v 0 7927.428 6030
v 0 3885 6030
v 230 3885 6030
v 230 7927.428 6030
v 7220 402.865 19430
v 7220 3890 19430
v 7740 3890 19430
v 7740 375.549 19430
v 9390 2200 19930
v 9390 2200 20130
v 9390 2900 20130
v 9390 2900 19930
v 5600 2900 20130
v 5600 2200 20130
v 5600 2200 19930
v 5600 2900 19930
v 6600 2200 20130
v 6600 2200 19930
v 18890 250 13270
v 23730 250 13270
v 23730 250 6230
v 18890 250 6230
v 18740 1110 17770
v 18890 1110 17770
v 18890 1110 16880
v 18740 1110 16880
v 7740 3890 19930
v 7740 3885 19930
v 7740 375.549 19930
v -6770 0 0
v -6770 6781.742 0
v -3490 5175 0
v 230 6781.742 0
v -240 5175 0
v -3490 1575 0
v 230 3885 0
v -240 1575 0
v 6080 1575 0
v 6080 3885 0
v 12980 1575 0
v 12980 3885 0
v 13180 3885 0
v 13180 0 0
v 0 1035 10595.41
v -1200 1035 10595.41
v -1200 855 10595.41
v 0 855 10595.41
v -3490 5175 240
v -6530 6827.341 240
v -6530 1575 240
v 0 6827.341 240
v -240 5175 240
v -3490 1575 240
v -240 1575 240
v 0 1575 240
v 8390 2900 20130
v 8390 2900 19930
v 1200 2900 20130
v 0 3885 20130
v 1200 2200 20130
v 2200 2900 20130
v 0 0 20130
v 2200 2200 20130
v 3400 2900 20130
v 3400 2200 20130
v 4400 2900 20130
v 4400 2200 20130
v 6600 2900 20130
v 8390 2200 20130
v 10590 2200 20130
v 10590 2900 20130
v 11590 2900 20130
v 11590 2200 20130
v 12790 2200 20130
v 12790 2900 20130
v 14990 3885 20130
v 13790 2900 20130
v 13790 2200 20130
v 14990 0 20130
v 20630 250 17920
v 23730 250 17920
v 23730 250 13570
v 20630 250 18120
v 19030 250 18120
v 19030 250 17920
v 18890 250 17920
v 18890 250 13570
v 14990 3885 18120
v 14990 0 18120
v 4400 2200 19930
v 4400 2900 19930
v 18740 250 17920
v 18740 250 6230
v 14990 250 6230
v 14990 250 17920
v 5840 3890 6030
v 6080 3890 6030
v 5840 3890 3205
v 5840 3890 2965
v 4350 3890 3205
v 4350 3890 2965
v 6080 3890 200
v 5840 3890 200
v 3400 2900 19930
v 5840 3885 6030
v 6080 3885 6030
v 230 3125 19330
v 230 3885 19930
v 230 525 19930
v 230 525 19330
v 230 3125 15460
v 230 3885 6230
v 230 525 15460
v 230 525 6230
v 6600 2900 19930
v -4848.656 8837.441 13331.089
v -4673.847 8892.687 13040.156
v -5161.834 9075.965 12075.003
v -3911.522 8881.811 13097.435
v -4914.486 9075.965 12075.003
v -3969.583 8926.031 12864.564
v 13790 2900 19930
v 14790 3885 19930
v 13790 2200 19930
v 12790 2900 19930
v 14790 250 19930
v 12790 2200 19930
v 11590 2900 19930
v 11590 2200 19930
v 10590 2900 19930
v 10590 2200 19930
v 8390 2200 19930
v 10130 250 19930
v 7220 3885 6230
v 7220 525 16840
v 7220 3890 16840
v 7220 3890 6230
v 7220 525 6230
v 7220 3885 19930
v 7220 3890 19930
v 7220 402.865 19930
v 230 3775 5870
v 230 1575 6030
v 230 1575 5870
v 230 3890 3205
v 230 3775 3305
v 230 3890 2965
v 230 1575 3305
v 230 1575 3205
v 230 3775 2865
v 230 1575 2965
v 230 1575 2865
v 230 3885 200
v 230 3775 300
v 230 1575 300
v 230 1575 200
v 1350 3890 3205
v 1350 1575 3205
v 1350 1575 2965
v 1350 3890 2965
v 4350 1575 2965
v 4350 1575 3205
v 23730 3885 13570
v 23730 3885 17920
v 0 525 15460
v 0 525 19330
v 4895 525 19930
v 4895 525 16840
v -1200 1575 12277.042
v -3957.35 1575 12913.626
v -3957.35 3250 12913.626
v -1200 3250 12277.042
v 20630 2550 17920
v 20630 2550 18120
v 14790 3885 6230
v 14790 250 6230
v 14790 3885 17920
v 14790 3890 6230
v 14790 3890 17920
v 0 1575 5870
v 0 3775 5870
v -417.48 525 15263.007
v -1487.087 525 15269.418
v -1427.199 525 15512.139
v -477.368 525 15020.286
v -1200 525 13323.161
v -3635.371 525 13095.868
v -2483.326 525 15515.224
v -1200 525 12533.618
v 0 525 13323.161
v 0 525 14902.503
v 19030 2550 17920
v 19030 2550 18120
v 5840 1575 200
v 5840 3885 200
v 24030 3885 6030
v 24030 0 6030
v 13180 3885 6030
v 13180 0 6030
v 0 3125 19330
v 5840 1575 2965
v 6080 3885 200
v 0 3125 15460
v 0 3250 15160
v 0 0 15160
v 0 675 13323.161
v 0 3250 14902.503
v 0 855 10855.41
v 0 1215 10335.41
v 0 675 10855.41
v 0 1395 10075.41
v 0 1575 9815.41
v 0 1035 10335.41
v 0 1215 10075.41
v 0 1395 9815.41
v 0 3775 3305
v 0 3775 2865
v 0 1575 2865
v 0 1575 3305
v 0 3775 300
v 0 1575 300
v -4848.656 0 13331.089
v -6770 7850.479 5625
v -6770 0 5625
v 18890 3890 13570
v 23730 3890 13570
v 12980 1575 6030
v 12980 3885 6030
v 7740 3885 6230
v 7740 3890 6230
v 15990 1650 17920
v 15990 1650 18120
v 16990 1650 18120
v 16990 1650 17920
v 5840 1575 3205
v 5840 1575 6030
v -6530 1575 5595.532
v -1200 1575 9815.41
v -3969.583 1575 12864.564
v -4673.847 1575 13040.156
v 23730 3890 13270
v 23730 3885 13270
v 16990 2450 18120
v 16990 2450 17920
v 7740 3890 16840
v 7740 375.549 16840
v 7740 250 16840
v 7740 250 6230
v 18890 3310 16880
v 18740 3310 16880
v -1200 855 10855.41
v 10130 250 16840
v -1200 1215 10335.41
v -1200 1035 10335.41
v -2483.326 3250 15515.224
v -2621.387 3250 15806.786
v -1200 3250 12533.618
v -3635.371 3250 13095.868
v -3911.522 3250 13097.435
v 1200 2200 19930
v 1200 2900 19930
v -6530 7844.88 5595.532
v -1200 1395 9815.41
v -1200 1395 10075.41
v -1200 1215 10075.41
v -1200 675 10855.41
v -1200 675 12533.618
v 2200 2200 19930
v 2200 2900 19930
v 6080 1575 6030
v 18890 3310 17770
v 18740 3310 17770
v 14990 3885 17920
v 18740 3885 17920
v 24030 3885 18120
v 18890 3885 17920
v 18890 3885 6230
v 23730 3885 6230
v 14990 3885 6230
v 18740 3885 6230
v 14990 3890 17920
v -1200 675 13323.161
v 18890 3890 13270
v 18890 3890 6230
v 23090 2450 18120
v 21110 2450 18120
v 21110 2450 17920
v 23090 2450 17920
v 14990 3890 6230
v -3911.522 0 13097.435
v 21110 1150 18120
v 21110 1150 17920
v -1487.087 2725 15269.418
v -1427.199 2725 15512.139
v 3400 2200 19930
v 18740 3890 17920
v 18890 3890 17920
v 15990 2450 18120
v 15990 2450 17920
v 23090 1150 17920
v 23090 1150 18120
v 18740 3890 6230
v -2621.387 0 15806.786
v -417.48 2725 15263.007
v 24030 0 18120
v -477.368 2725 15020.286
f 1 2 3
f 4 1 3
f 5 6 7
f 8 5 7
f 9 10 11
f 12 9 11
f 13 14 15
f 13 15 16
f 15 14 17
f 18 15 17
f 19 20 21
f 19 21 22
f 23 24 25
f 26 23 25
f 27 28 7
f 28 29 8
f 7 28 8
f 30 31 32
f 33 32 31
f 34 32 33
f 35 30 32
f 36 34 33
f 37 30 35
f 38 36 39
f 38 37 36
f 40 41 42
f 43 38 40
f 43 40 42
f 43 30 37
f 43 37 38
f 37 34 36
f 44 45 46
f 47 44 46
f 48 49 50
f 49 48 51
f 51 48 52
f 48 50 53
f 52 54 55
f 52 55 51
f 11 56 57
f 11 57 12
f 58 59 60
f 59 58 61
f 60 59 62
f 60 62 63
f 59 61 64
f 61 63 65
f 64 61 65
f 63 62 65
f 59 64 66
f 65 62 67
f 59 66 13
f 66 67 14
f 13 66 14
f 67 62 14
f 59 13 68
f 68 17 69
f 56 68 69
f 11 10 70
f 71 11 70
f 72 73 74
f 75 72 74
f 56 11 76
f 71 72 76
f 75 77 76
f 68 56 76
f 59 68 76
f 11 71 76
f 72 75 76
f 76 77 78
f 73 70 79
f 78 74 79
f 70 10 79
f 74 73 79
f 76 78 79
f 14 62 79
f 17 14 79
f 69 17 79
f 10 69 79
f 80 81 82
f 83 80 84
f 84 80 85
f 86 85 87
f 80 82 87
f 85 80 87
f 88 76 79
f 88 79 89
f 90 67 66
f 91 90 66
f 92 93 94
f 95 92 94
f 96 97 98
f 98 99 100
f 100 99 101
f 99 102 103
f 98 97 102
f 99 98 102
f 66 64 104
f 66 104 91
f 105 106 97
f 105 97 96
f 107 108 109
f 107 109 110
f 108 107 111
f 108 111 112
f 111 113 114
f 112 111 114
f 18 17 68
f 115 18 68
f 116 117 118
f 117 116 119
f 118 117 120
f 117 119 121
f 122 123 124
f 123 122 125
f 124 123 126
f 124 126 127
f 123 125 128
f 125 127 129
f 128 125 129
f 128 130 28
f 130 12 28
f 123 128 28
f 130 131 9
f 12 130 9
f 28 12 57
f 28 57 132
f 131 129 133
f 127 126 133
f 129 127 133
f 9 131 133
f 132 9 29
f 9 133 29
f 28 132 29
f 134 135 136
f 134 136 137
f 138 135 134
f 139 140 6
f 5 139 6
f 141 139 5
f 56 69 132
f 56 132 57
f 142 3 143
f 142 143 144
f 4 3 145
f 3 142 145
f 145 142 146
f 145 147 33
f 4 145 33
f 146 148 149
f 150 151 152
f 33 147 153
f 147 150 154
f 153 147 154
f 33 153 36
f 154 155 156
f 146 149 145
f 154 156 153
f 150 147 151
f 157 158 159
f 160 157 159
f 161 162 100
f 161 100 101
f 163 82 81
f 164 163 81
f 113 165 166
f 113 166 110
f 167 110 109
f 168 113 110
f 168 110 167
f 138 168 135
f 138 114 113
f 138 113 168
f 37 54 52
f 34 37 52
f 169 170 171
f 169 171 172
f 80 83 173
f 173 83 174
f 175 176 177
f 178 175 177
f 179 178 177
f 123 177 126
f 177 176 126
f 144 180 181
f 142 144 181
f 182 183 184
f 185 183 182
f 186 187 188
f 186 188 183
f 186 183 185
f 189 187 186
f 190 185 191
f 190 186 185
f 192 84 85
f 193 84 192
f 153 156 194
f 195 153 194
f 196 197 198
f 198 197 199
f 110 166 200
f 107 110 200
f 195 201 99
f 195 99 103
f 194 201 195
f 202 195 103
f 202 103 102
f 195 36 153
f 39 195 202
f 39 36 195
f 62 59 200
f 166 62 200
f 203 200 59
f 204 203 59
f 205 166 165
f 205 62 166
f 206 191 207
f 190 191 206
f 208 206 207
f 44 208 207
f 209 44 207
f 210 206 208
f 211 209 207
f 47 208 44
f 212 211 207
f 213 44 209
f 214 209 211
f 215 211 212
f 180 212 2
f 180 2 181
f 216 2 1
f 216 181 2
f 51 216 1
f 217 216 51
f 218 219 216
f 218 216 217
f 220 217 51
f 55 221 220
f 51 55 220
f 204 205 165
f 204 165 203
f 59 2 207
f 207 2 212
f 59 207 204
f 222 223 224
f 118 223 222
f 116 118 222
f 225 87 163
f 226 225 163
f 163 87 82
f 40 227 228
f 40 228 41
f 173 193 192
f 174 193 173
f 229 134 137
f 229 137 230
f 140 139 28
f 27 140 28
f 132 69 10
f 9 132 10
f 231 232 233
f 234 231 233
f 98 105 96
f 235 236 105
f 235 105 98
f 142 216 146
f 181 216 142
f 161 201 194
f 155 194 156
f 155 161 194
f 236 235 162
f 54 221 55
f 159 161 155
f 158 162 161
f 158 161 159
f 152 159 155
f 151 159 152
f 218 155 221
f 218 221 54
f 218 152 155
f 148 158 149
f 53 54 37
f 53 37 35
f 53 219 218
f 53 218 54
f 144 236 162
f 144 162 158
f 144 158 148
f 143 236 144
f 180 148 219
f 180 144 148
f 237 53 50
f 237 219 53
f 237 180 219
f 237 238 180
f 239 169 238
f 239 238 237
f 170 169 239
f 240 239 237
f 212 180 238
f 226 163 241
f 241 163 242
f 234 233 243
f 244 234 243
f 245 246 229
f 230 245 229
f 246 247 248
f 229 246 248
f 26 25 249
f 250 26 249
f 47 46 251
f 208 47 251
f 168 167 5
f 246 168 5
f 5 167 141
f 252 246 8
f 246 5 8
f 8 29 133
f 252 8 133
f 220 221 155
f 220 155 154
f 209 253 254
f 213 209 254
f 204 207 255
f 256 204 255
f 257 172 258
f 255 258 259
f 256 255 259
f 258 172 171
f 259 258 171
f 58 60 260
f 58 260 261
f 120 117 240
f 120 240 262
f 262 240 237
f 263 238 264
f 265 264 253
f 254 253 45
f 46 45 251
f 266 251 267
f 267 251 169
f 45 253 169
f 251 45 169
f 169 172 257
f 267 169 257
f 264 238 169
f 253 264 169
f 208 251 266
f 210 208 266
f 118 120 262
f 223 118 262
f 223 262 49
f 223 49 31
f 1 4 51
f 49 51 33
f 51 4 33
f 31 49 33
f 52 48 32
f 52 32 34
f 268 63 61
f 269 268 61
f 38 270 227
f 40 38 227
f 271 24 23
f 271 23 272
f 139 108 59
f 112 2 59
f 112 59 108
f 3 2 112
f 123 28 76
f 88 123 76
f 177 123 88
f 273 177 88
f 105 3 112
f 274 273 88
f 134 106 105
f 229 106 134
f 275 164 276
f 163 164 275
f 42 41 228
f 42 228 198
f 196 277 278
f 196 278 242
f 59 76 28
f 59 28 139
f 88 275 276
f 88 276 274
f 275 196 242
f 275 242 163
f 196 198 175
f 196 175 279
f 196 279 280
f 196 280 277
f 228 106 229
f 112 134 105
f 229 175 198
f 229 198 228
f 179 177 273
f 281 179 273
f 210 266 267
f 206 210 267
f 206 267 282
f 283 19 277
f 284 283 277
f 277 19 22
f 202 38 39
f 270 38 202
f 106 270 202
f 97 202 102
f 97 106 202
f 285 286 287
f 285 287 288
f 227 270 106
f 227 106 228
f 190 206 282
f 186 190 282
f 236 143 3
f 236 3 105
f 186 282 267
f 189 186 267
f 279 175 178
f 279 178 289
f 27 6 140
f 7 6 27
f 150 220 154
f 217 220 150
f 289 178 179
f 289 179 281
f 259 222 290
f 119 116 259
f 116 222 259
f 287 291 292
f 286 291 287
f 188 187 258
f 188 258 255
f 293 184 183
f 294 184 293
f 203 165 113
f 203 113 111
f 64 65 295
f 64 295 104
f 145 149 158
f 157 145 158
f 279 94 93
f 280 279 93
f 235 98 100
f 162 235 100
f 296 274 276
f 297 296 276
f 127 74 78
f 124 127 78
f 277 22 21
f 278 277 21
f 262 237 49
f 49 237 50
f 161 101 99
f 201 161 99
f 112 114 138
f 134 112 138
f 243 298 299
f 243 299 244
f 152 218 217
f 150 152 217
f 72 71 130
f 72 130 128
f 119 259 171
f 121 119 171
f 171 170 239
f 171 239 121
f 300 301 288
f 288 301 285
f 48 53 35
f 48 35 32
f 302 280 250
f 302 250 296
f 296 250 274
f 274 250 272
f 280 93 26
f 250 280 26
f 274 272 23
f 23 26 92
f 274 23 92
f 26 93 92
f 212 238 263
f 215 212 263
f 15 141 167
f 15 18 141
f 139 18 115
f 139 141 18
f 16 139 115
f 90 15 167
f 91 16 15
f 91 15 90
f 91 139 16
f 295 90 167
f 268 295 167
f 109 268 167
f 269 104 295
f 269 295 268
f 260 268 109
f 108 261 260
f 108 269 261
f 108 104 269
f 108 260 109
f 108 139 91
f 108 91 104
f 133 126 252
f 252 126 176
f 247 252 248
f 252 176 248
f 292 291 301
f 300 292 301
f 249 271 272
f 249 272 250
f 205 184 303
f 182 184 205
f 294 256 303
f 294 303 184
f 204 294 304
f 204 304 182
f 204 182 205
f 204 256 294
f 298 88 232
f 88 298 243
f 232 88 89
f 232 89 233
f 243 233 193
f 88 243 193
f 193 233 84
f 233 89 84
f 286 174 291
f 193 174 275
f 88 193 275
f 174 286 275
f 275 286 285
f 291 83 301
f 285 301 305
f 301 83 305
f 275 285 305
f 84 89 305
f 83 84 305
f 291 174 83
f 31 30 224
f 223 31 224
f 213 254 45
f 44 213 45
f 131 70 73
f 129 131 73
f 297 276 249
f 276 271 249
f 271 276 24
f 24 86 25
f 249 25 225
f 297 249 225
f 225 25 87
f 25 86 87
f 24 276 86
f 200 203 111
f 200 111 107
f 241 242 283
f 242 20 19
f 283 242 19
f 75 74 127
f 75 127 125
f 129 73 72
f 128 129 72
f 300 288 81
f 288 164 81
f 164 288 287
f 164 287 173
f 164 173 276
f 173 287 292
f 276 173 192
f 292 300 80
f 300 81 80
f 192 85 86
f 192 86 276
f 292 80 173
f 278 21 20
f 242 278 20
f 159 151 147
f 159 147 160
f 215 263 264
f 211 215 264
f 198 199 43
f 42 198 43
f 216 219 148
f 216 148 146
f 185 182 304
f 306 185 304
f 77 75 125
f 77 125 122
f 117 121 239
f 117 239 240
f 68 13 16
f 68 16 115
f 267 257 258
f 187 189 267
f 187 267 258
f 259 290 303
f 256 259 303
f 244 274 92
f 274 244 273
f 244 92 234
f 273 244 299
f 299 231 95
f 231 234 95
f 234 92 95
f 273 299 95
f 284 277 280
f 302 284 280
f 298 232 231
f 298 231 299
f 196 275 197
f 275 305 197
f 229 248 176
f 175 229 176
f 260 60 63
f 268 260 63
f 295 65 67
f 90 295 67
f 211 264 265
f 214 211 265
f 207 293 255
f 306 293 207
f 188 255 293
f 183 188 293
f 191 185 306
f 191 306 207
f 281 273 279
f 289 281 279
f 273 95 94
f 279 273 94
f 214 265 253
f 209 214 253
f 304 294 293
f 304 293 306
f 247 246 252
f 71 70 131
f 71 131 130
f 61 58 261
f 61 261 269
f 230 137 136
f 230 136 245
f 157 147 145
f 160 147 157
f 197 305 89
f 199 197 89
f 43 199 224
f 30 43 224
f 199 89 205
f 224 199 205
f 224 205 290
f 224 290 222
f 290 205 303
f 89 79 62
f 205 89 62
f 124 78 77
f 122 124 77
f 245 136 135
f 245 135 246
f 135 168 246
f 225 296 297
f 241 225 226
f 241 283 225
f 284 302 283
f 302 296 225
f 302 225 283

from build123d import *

# Parameters (mm, degrees)
AUFSATZ_LINEAR_AUSTRAGEN4_DEPTH      = 250
SKIZZE5_W                            = 12750
SKIZZE5_H                            = 5830
AUFSATZ_LINEAR_AUSTRAGEN5_DEPTH      = 3635
SKIZZE6_W                            = 200
SKIZZE6_H                            = 11690
SKIZZE6_W_2                          = 520
SKIZZE6_H_2                          = 10610
SKIZZE6_H_3                          = 500
SKIZZE6_W_3                          = 1120
SKIZZE6_H_4                          = 240
AUFSATZ_LINEAR_AUSTRAGEN6_DEPTH      = 3640
SCHNITT_LINEAR_AUSTRAGEN1_REACH      = 30348.456
SKIZZE7_W                            = 1980
SKIZZE7_H                            = 1300
SKIZZE7_W_2                          = 1600
SKIZZE7_H_2                          = 2300
SKIZZE7_W_3                          = 1000
SKIZZE7_H_3                          = 800
SCHNITT_LINEAR_AUSTRAGEN2_REACH      = 27879.968
SKIZZE8_W                            = 890
SKIZZE8_H                            = 2200
SCHNITT_LINEAR_AUSTRAGEN3_REACH      = 31589.813
SKIZZE9_W                            = 3870
SKIZZE9_H                            = 2600
SKIZZE9_W_2                          = 2565
SKIZZE9_H_2                          = 2200
AUFSATZ_LINEAR_AUSTRAGEN7_DEPTH      = 3000
SKIZZE11_W                           = 6990
SKIZZE11_H                           = 13700
AUFSATZ_LINEAR_AUSTRAGEN8_DEPTH      = 275
SKIZZE12_W                           = 12750
SKIZZE12_H                           = 5830
AUFSATZ_LINEAR_AUSTRAGEN9_DEPTH      = 1325
AUFSATZ_LINEAR_AUSTRAGEN10_REACH     = 31462.736
SCHNITT_LINEAR_AUSTRAGEN4_DEPTH      = 3090
AUFSATZ_LINEAR_AUSTRAGEN12_DEPTH     = 8000
AUFSATZ_LINEAR_AUSTRAGEN13_DEPTH     = 1575
SCHNITT_LINEAR_AUSTRAGEN8_DEPTH      = 37827.06409607
SCHNITT_LINEAR_AUSTRAGEN8_DEPTH_BACK = 37827.06409607
AUFSATZ_LINEAR_AUSTRAGEN14_REACH     = 31776.265
SKIZZE21_W                           = 230
SKIZZE21_H                           = 6030
SCHNITT_LINEAR_AUSTRAGEN9_DEPTH      = 1200
SCHNITT_LINEAR_AUSTRAGEN10_DEPTH     = 1050
SKIZZE24_W                           = 1040
SKIZZE24_H                           = 2200
SCHNITT_LINEAR_AUSTRAGEN11_DEPTH     = 300
SCHNITT_LINEAR_AUSTRAGEN12_REACH     = 32636.812
SKIZZE25_W                           = 1000
SKIZZE25_H                           = 700
SCHNITT_LINEAR_AUSTRAGEN13_REACH     = 32513.828
SKIZZE26_W                           = 6900
SKIZZE26_H                           = 3817.744695197
SCHNITT_LINEAR_AUSTRAGEN14_REACH     = 32489.323
SKIZZE27_W                           = 3250
SKIZZE27_H                           = 3600


with BuildPart() as part:
    # Skizze1 → Aufsatz-Linear austragen4 (new body)
    with BuildSketch(Plane(origin=(0, 0, 0), x_dir=(1, 0, 0), z_dir=(0, 1, 0))):
        Polygon((14990, -18120), (14990, -20130), (0, -20130), (0, 0), (13180, 0), (13180, -6030), (24030, -6030), (24030, -18120), align=None)
    extrude(amount=AUFSATZ_LINEAR_AUSTRAGEN4_DEPTH)

    # Skizze5 → Aufsatz-Linear austragen5 (add)
    with BuildSketch(Plane(origin=(0, 250, 0), x_dir=(1, 0, 0), z_dir=(0, 1, 0))):
        Polygon((0, -20130), (14990, -20130), (14990, -18120), (24030, -18120), (24030, -6030), (13180, -6030), (13180, 0), (0, 0), align=None)
        Polygon((23730, -6230), (23730, -17920), (14790, -17920), (14790, -19930), (230, -19930), (230, -6230), align=None, mode=Mode.SUBTRACT)
        with Locations((6605, -3115)):
            Rectangle(SKIZZE5_W, SKIZZE5_H, mode=Mode.SUBTRACT)
    extrude(amount=AUFSATZ_LINEAR_AUSTRAGEN5_DEPTH)

    # Skizze6 → Aufsatz-Linear austragen6 (add)
    with BuildSketch(Plane(origin=(0, 250, 0), x_dir=(1, 0, 0), z_dir=(0, 1, 0))):
        Polygon((18890, -17920), (18890, -13570), (23730, -13570), (23730, -13270), (18890, -13270), (18890, -6230), (18740, -6230), (18740, -17920), align=None)
        with Locations((14890, -12075)):
            Rectangle(SKIZZE6_W, SKIZZE6_H)
        Polygon((5840, -200), (6080, -200), (6080, -6030), (5840, -6030), (5840, -3205), (4350, -3205), (4350, -2965), (5840, -2965), align=None)
        with Locations((7480, -11535)):
            Rectangle(SKIZZE6_W_2, SKIZZE6_H_2)
        with Locations((7480, -19680)):
            Rectangle(SKIZZE6_W_2, SKIZZE6_H_3)
        with Locations((790, -3085)):
            Rectangle(SKIZZE6_W_3, SKIZZE6_H_4)
    extrude(amount=AUFSATZ_LINEAR_AUSTRAGEN6_DEPTH)

    # Skizze7 → Schnitt-Linear austragen1 (cut, up to next)
    with BuildSketch(Plane.XY.offset(18120), mode=Mode.PRIVATE) as schnitt_linear_austragen1_sk1:
        with Locations((22100, 1800)):
            Rectangle(SKIZZE7_W, SKIZZE7_H)
    schnitt_linear_austragen1_tool1 = extrude(schnitt_linear_austragen1_sk1.sketch, amount=-SCHNITT_LINEAR_AUSTRAGEN1_REACH, mode=Mode.PRIVATE) & part.part
    # Skizze7 → Schnitt-Linear austragen1 (cut, up to next)
    with BuildSketch(Plane.XY.offset(18120), mode=Mode.PRIVATE) as schnitt_linear_austragen1_sk2:
        with Locations((19830, 1400)):
            Rectangle(SKIZZE7_W_2, SKIZZE7_H_2)
    schnitt_linear_austragen1_tool2 = extrude(schnitt_linear_austragen1_sk2.sketch, amount=-SCHNITT_LINEAR_AUSTRAGEN1_REACH, mode=Mode.PRIVATE) & part.part
    # Skizze7 → Schnitt-Linear austragen1 (cut, up to next)
    with BuildSketch(Plane.XY.offset(18120), mode=Mode.PRIVATE) as schnitt_linear_austragen1_sk3:
        with Locations((16490, 2050)):
            Rectangle(SKIZZE7_W_3, SKIZZE7_H_3)
    schnitt_linear_austragen1_tool3 = extrude(schnitt_linear_austragen1_sk3.sketch, amount=-SCHNITT_LINEAR_AUSTRAGEN1_REACH, mode=Mode.PRIVATE) & part.part
    add(schnitt_linear_austragen1_tool1.solids().sort_by_distance((22100, 1800, 18120))[0], mode=Mode.SUBTRACT)
    add(schnitt_linear_austragen1_tool2.solids().sort_by_distance((19830, 1400, 18120))[0], mode=Mode.SUBTRACT)
    add(schnitt_linear_austragen1_tool3.solids().sort_by_distance((16490, 2050, 18120))[0], mode=Mode.SUBTRACT)

    # Skizze8 → Schnitt-Linear austragen2 (cut, up to next)
    with BuildSketch(Plane(origin=(18890, 0, 0), x_dir=(0, 0, -1), z_dir=(1, 0, 0)), mode=Mode.PRIVATE) as schnitt_linear_austragen2_sk1:
        with Locations((-17325, 2210)):
            Rectangle(SKIZZE8_W, SKIZZE8_H)
    schnitt_linear_austragen2_tool1 = extrude(schnitt_linear_austragen2_sk1.sketch, amount=-SCHNITT_LINEAR_AUSTRAGEN2_REACH, mode=Mode.PRIVATE) & part.part
    add(schnitt_linear_austragen2_tool1.solids().sort_by_distance((18890, 2210, 17325))[0], mode=Mode.SUBTRACT)

    # Skizze9 → Schnitt-Linear austragen3 (cut, up to next)
    with BuildSketch(Plane.ZY, mode=Mode.PRIVATE) as schnitt_linear_austragen3_sk1:
        with Locations((17395, 1825)):
            Rectangle(SKIZZE9_W, SKIZZE9_H)
    schnitt_linear_austragen3_tool1 = extrude(schnitt_linear_austragen3_sk1.sketch, amount=-SCHNITT_LINEAR_AUSTRAGEN3_REACH, mode=Mode.PRIVATE) & part.part
    # Skizze9 → Schnitt-Linear austragen3 (cut, up to next)
    with BuildSketch(Plane.ZY, mode=Mode.PRIVATE) as schnitt_linear_austragen3_sk2:
        with Locations((1582.5, 2675)):
            Rectangle(SKIZZE9_W_2, SKIZZE9_H_2)
    schnitt_linear_austragen3_tool2 = extrude(schnitt_linear_austragen3_sk2.sketch, amount=-SCHNITT_LINEAR_AUSTRAGEN3_REACH, mode=Mode.PRIVATE) & part.part
    # Skizze9 → Schnitt-Linear austragen3 (cut, up to next)
    with BuildSketch(Plane.ZY, mode=Mode.PRIVATE) as schnitt_linear_austragen3_sk3:
        with Locations((4587.5, 2675)):
            Rectangle(SKIZZE9_W_2, SKIZZE9_H_2)
    schnitt_linear_austragen3_tool3 = extrude(schnitt_linear_austragen3_sk3.sketch, amount=-SCHNITT_LINEAR_AUSTRAGEN3_REACH, mode=Mode.PRIVATE) & part.part
    add(schnitt_linear_austragen3_tool1.solids().sort_by_distance((0, 1825, 17395))[0], mode=Mode.SUBTRACT)
    add(schnitt_linear_austragen3_tool2.solids().sort_by_distance((0, 2675, 1582.5))[0], mode=Mode.SUBTRACT)
    add(schnitt_linear_austragen3_tool3.solids().sort_by_distance((0, 2675, 4587.5))[0], mode=Mode.SUBTRACT)

    # Skizze10 → Aufsatz-Linear austragen7 (add)
    with BuildSketch(Plane(origin=(0, 250, 0), x_dir=(1, 0, 0), z_dir=(0, 1, 0))):
        Polygon((0, -14902.502697154), (0, -15160), (-2621.386680711, -15806.785799313), (-3994.91726562, -12922.29932281), (0, -12000), (0, -12256.576026948), (-3635.371342731, -13095.867632914), (-2483.325679823, -15515.224123031), align=None)
    extrude(amount=AUFSATZ_LINEAR_AUSTRAGEN7_DEPTH)

    # Skizze11 → Aufsatz-Linear austragen8 (add)
    with BuildSketch(Plane(origin=(0, 250, 0), x_dir=(1, 0, 0), z_dir=(0, 1, 0))):
        with Locations((3725, -13080)):
            Rectangle(SKIZZE11_W, SKIZZE11_H)
    extrude(amount=AUFSATZ_LINEAR_AUSTRAGEN8_DEPTH)

    # Skizze12 → Aufsatz-Linear austragen9 (add)
    with BuildSketch(Plane(origin=(0, 250, 0), x_dir=(1, 0, 0), z_dir=(0, 1, 0))):
        with Locations((6605, -3115)):
            Rectangle(SKIZZE12_W, SKIZZE12_H)
    extrude(amount=AUFSATZ_LINEAR_AUSTRAGEN9_DEPTH)

    # Aufsatz-Linear austragen10: up to this face of the body (flat: up to its plane)
    aufsatz_linear_austragen10_end = Plane(part.part.faces().sort_by_distance((7480, 2070, 16840))[0])
    # Skizze13 → Aufsatz-Linear austragen10 (add, up to the picked face)
    with BuildSketch(Plane(origin=(0, 0, 19930), x_dir=(-1, 0, 0), z_dir=(0, 0, -1)), mode=Mode.PRIVATE) as aufsatz_linear_austragen10_sk1:
        Polygon((-4895, 525), (-10130, 250), (-4895, 250), align=None)
    aufsatz_linear_austragen10_tool1 = split(extrude(aufsatz_linear_austragen10_sk1.sketch, amount=AUFSATZ_LINEAR_AUSTRAGEN10_REACH, mode=Mode.PRIVATE), bisect_by=aufsatz_linear_austragen10_end, keep=Keep.BOTH, mode=Mode.PRIVATE)
    add(aufsatz_linear_austragen10_tool1.solids().sort_by(Axis((6640, 341.666667, 19930), (0, 0, -1)))[0])

    # Skizze14 → Schnitt-Linear austragen4 (cut)
    with BuildSketch(Plane(origin=(0, 0, 19930), x_dir=(-1, 0, 0), z_dir=(0, 0, -1))):
        Polygon((-4895, 525), (-7220, 525), (-7220, 402.865329513), align=None)
    extrude(amount=SCHNITT_LINEAR_AUSTRAGEN4_DEPTH, mode=Mode.SUBTRACT)

    # Skizze18 → Aufsatz-Linear austragen12 (add)
    with BuildSketch(Plane(origin=(0, 1575, 0), x_dir=(1, 0, 0), z_dir=(0, 1, 0))):
        Polygon((0, 0), (-6770, 0), (-6770, -5625), (-4848.656305147, -13331.088658084), (-3911.521546198, -13097.43472024), (-3969.582801141, -12864.563745934), (-4673.846585785, -13040.156428834), (-6530, -5595.531705383), (-6530, -240), (0, -240), align=None)
    extrude(amount=AUFSATZ_LINEAR_AUSTRAGEN12_DEPTH)

    # Skizze19 → Aufsatz-Linear austragen13 (add)
    with BuildSketch(Plane.XZ.offset(-1575)):
        Polygon((-2621.386680711, 15806.785799313), (0, 15160), (0, 0), (-6770, 0), (-6770, 5625), (-4848.656305147, 13331.088658084), (-3911.521546198, 13097.43472024), align=None)
    extrude(amount=AUFSATZ_LINEAR_AUSTRAGEN13_DEPTH)

    # Skizze20 → Schnitt-Linear austragen8 (cut, two sides)
    with BuildSketch(Plane.ZY.offset(-23790)) as schnitt_linear_austragen8_sk:
        Polygon((12075.002540109, 9075.964650046), (-1187.358000417, 6556.146433623), (-1198.809144532, 13266.908889698), (21923.923844096, 13266.908889698), (21923.923844096, 7205.71067909), align=None)
    extrude(amount=SCHNITT_LINEAR_AUSTRAGEN8_DEPTH, mode=Mode.SUBTRACT)
    extrude(schnitt_linear_austragen8_sk.sketch, amount=-SCHNITT_LINEAR_AUSTRAGEN8_DEPTH_BACK, mode=Mode.SUBTRACT)

    # Aufsatz-Linear austragen14: up to this plane
    aufsatz_linear_austragen14_end = Plane(origin=(24030, 9075.964650046, 12075.002540109), z_dir=(0, -0.982424863110441, 0.18665848049963168))
    # Skizze21 → Aufsatz-Linear austragen14 (add, up to the surface)
    with BuildSketch(Plane(origin=(0, 3885, 0), x_dir=(1, 0, 0), z_dir=(0, 1, 0)), mode=Mode.PRIVATE) as aufsatz_linear_austragen14_sk1:
        with Locations((115, -3015)):
            Rectangle(SKIZZE21_W, SKIZZE21_H)
    aufsatz_linear_austragen14_tool1 = split(extrude(aufsatz_linear_austragen14_sk1.sketch, amount=AUFSATZ_LINEAR_AUSTRAGEN14_REACH, mode=Mode.PRIVATE), bisect_by=aufsatz_linear_austragen14_end, keep=Keep.BOTH, mode=Mode.PRIVATE)
    add(aufsatz_linear_austragen14_tool1.solids().sort_by_distance((115, 3885, 3015))[0])

    # Skizze22 → Schnitt-Linear austragen9 (cut)
    with BuildSketch(Plane.ZY.offset(1200)):
        Polygon((9555.409574458, 1575), (9815.409574458, 1575), (9815.409574458, 1395), (10075.409574458, 1395), (10075.409574458, 1215), (10335.409574458, 1215), (10335.409574458, 1035), (10595.409574458, 1035), (10595.409574458, 855), (10855.409574458, 855), (10855.409574458, 675), (13323.160508591, 675), (13323.160508591, 5461.397070598), (9555.409574458, 5461.397070598), align=None)
    extrude(amount=-SCHNITT_LINEAR_AUSTRAGEN9_DEPTH, mode=Mode.SUBTRACT)

    # Skizze23 → Schnitt-Linear austragen10 (cut)
    with BuildSketch(Plane(origin=(0, 1575, 0), x_dir=(1, 0, 0), z_dir=(0, 1, 0))):
        Polygon((-1200, -13323.160508591), (-1200, -12533.617856299), (-3635.371342731, -13095.867632914), (-2483.325679823, -15515.224123031), (0, -14902.502697154), (0, -13323.160508591), align=None)
    extrude(amount=-SCHNITT_LINEAR_AUSTRAGEN10_DEPTH, mode=Mode.SUBTRACT)

    # Skizze24 → Schnitt-Linear austragen11 (cut)
    with BuildSketch(Plane(origin=(3525.845171827, 0, 14290.0533399), x_dir=(0.9708839558187317, 0, -0.23955029604191938), z_dir=(0.23955029604191938, 0, 0.9708839558187317))):
        with Locations((-4581.582487995, 1625)):
            Rectangle(SKIZZE24_W, SKIZZE24_H)
    extrude(amount=-SCHNITT_LINEAR_AUSTRAGEN11_DEPTH, mode=Mode.SUBTRACT)

    # Skizze25 → Schnitt-Linear austragen12 (cut, up to next)
    with BuildSketch(Plane.XY.offset(20130), mode=Mode.PRIVATE) as schnitt_linear_austragen12_sk1:
        with Locations((1700, 2550)):
            Rectangle(SKIZZE25_W, SKIZZE25_H)
    schnitt_linear_austragen12_tool1 = extrude(schnitt_linear_austragen12_sk1.sketch, amount=-SCHNITT_LINEAR_AUSTRAGEN12_REACH, mode=Mode.PRIVATE) & part.part
    # Skizze25 → Schnitt-Linear austragen12 (cut, up to next)
    with BuildSketch(Plane.XY.offset(20130), mode=Mode.PRIVATE) as schnitt_linear_austragen12_sk2:
        with Locations((3900, 2550)):
            Rectangle(SKIZZE25_W, SKIZZE25_H)
    schnitt_linear_austragen12_tool2 = extrude(schnitt_linear_austragen12_sk2.sketch, amount=-SCHNITT_LINEAR_AUSTRAGEN12_REACH, mode=Mode.PRIVATE) & part.part
    # Skizze25 → Schnitt-Linear austragen12 (cut, up to next)
    with BuildSketch(Plane.XY.offset(20130), mode=Mode.PRIVATE) as schnitt_linear_austragen12_sk3:
        with Locations((6100, 2550)):
            Rectangle(SKIZZE25_W, SKIZZE25_H)
    schnitt_linear_austragen12_tool3 = extrude(schnitt_linear_austragen12_sk3.sketch, amount=-SCHNITT_LINEAR_AUSTRAGEN12_REACH, mode=Mode.PRIVATE) & part.part
    # Skizze25 → Schnitt-Linear austragen12 (cut, up to next)
    with BuildSketch(Plane.XY.offset(20130), mode=Mode.PRIVATE) as schnitt_linear_austragen12_sk4:
        with Locations((8890, 2550)):
            Rectangle(SKIZZE25_W, SKIZZE25_H)
    schnitt_linear_austragen12_tool4 = extrude(schnitt_linear_austragen12_sk4.sketch, amount=-SCHNITT_LINEAR_AUSTRAGEN12_REACH, mode=Mode.PRIVATE) & part.part
    # Skizze25 → Schnitt-Linear austragen12 (cut, up to next)
    with BuildSketch(Plane.XY.offset(20130), mode=Mode.PRIVATE) as schnitt_linear_austragen12_sk5:
        with Locations((11090, 2550)):
            Rectangle(SKIZZE25_W, SKIZZE25_H)
    schnitt_linear_austragen12_tool5 = extrude(schnitt_linear_austragen12_sk5.sketch, amount=-SCHNITT_LINEAR_AUSTRAGEN12_REACH, mode=Mode.PRIVATE) & part.part
    # Skizze25 → Schnitt-Linear austragen12 (cut, up to next)
    with BuildSketch(Plane.XY.offset(20130), mode=Mode.PRIVATE) as schnitt_linear_austragen12_sk6:
        with Locations((13290, 2550)):
            Rectangle(SKIZZE25_W, SKIZZE25_H)
    schnitt_linear_austragen12_tool6 = extrude(schnitt_linear_austragen12_sk6.sketch, amount=-SCHNITT_LINEAR_AUSTRAGEN12_REACH, mode=Mode.PRIVATE) & part.part
    add(schnitt_linear_austragen12_tool1.solids().sort_by_distance((1700, 2550, 20130))[0], mode=Mode.SUBTRACT)
    add(schnitt_linear_austragen12_tool2.solids().sort_by_distance((3900, 2550, 20130))[0], mode=Mode.SUBTRACT)
    add(schnitt_linear_austragen12_tool3.solids().sort_by_distance((6100, 2550, 20130))[0], mode=Mode.SUBTRACT)
    add(schnitt_linear_austragen12_tool4.solids().sort_by_distance((8890, 2550, 20130))[0], mode=Mode.SUBTRACT)
    add(schnitt_linear_austragen12_tool5.solids().sort_by_distance((11090, 2550, 20130))[0], mode=Mode.SUBTRACT)
    add(schnitt_linear_austragen12_tool6.solids().sort_by_distance((13290, 2550, 20130))[0], mode=Mode.SUBTRACT)

    # Skizze26 → Schnitt-Linear austragen13 (cut, up to next)
    with BuildSketch(Plane.XY.offset(200), mode=Mode.PRIVATE) as schnitt_linear_austragen13_sk1:
        with Locations((9530, 3483.872347599)):
            Rectangle(SKIZZE26_W, SKIZZE26_H)
    schnitt_linear_austragen13_tool1 = extrude(schnitt_linear_austragen13_sk1.sketch, amount=-SCHNITT_LINEAR_AUSTRAGEN13_REACH, mode=Mode.PRIVATE) & part.part
    add(schnitt_linear_austragen13_tool1.solids().sort_by_distance((9530, 3483.872348, 200))[0], mode=Mode.SUBTRACT)

    # Skizze27 → Schnitt-Linear austragen14 (cut, up to next)
    with BuildSketch(Plane.XY.offset(240), mode=Mode.PRIVATE) as schnitt_linear_austragen14_sk1:
        with Locations((-1865, 3375)):
            Rectangle(SKIZZE27_W, SKIZZE27_H)
    schnitt_linear_austragen14_tool1 = extrude(schnitt_linear_austragen14_sk1.sketch, amount=-SCHNITT_LINEAR_AUSTRAGEN14_REACH, mode=Mode.PRIVATE) & part.part
    add(schnitt_linear_austragen14_tool1.solids().sort_by_distance((-1865, 3375, 240))[0], mode=Mode.SUBTRACT)


solid = part.part
